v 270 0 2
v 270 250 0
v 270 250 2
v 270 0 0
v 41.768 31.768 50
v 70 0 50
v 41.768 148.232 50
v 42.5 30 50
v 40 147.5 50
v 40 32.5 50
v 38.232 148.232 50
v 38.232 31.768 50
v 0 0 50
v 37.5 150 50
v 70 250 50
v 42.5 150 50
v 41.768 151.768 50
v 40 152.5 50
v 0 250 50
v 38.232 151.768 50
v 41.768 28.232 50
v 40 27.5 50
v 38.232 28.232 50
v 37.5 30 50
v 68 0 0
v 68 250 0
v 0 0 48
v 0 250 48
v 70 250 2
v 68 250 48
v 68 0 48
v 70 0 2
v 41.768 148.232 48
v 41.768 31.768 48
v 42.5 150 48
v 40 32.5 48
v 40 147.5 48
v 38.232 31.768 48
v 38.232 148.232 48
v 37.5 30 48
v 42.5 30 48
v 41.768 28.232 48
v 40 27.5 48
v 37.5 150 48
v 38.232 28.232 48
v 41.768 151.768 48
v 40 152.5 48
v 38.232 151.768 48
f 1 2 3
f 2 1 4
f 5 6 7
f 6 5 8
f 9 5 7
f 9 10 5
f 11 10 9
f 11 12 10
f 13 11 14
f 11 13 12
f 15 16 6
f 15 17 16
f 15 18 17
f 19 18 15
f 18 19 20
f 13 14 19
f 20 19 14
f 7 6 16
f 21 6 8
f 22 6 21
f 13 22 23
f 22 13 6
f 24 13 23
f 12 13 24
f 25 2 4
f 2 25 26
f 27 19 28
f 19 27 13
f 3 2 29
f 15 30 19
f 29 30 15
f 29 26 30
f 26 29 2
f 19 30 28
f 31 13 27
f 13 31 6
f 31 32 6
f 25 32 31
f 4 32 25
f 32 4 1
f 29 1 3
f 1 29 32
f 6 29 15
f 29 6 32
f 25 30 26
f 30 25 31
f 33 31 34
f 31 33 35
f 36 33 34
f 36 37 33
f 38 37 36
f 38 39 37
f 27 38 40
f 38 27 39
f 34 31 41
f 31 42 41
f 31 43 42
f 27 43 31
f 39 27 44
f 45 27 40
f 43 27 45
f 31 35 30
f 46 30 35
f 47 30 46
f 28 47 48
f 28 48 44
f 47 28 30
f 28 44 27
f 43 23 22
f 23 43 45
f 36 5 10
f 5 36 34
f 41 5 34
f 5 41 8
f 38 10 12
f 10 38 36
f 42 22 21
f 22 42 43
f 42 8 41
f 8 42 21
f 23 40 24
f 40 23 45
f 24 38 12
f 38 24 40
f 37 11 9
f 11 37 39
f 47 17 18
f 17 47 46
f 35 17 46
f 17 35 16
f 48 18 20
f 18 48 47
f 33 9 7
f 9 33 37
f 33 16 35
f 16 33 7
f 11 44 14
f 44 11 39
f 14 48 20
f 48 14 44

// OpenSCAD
difference()
{
  cube([270,250,50]);
  translate([70,-2,2]) cube([320,260,130]);
  translate([-2,-2,-2]) cube([70,260,50]);
  translate([40,30,45]) cylinder(h=15,d=5);
  translate([40,150,45]) cylinder(h=15,d=5);  
}
